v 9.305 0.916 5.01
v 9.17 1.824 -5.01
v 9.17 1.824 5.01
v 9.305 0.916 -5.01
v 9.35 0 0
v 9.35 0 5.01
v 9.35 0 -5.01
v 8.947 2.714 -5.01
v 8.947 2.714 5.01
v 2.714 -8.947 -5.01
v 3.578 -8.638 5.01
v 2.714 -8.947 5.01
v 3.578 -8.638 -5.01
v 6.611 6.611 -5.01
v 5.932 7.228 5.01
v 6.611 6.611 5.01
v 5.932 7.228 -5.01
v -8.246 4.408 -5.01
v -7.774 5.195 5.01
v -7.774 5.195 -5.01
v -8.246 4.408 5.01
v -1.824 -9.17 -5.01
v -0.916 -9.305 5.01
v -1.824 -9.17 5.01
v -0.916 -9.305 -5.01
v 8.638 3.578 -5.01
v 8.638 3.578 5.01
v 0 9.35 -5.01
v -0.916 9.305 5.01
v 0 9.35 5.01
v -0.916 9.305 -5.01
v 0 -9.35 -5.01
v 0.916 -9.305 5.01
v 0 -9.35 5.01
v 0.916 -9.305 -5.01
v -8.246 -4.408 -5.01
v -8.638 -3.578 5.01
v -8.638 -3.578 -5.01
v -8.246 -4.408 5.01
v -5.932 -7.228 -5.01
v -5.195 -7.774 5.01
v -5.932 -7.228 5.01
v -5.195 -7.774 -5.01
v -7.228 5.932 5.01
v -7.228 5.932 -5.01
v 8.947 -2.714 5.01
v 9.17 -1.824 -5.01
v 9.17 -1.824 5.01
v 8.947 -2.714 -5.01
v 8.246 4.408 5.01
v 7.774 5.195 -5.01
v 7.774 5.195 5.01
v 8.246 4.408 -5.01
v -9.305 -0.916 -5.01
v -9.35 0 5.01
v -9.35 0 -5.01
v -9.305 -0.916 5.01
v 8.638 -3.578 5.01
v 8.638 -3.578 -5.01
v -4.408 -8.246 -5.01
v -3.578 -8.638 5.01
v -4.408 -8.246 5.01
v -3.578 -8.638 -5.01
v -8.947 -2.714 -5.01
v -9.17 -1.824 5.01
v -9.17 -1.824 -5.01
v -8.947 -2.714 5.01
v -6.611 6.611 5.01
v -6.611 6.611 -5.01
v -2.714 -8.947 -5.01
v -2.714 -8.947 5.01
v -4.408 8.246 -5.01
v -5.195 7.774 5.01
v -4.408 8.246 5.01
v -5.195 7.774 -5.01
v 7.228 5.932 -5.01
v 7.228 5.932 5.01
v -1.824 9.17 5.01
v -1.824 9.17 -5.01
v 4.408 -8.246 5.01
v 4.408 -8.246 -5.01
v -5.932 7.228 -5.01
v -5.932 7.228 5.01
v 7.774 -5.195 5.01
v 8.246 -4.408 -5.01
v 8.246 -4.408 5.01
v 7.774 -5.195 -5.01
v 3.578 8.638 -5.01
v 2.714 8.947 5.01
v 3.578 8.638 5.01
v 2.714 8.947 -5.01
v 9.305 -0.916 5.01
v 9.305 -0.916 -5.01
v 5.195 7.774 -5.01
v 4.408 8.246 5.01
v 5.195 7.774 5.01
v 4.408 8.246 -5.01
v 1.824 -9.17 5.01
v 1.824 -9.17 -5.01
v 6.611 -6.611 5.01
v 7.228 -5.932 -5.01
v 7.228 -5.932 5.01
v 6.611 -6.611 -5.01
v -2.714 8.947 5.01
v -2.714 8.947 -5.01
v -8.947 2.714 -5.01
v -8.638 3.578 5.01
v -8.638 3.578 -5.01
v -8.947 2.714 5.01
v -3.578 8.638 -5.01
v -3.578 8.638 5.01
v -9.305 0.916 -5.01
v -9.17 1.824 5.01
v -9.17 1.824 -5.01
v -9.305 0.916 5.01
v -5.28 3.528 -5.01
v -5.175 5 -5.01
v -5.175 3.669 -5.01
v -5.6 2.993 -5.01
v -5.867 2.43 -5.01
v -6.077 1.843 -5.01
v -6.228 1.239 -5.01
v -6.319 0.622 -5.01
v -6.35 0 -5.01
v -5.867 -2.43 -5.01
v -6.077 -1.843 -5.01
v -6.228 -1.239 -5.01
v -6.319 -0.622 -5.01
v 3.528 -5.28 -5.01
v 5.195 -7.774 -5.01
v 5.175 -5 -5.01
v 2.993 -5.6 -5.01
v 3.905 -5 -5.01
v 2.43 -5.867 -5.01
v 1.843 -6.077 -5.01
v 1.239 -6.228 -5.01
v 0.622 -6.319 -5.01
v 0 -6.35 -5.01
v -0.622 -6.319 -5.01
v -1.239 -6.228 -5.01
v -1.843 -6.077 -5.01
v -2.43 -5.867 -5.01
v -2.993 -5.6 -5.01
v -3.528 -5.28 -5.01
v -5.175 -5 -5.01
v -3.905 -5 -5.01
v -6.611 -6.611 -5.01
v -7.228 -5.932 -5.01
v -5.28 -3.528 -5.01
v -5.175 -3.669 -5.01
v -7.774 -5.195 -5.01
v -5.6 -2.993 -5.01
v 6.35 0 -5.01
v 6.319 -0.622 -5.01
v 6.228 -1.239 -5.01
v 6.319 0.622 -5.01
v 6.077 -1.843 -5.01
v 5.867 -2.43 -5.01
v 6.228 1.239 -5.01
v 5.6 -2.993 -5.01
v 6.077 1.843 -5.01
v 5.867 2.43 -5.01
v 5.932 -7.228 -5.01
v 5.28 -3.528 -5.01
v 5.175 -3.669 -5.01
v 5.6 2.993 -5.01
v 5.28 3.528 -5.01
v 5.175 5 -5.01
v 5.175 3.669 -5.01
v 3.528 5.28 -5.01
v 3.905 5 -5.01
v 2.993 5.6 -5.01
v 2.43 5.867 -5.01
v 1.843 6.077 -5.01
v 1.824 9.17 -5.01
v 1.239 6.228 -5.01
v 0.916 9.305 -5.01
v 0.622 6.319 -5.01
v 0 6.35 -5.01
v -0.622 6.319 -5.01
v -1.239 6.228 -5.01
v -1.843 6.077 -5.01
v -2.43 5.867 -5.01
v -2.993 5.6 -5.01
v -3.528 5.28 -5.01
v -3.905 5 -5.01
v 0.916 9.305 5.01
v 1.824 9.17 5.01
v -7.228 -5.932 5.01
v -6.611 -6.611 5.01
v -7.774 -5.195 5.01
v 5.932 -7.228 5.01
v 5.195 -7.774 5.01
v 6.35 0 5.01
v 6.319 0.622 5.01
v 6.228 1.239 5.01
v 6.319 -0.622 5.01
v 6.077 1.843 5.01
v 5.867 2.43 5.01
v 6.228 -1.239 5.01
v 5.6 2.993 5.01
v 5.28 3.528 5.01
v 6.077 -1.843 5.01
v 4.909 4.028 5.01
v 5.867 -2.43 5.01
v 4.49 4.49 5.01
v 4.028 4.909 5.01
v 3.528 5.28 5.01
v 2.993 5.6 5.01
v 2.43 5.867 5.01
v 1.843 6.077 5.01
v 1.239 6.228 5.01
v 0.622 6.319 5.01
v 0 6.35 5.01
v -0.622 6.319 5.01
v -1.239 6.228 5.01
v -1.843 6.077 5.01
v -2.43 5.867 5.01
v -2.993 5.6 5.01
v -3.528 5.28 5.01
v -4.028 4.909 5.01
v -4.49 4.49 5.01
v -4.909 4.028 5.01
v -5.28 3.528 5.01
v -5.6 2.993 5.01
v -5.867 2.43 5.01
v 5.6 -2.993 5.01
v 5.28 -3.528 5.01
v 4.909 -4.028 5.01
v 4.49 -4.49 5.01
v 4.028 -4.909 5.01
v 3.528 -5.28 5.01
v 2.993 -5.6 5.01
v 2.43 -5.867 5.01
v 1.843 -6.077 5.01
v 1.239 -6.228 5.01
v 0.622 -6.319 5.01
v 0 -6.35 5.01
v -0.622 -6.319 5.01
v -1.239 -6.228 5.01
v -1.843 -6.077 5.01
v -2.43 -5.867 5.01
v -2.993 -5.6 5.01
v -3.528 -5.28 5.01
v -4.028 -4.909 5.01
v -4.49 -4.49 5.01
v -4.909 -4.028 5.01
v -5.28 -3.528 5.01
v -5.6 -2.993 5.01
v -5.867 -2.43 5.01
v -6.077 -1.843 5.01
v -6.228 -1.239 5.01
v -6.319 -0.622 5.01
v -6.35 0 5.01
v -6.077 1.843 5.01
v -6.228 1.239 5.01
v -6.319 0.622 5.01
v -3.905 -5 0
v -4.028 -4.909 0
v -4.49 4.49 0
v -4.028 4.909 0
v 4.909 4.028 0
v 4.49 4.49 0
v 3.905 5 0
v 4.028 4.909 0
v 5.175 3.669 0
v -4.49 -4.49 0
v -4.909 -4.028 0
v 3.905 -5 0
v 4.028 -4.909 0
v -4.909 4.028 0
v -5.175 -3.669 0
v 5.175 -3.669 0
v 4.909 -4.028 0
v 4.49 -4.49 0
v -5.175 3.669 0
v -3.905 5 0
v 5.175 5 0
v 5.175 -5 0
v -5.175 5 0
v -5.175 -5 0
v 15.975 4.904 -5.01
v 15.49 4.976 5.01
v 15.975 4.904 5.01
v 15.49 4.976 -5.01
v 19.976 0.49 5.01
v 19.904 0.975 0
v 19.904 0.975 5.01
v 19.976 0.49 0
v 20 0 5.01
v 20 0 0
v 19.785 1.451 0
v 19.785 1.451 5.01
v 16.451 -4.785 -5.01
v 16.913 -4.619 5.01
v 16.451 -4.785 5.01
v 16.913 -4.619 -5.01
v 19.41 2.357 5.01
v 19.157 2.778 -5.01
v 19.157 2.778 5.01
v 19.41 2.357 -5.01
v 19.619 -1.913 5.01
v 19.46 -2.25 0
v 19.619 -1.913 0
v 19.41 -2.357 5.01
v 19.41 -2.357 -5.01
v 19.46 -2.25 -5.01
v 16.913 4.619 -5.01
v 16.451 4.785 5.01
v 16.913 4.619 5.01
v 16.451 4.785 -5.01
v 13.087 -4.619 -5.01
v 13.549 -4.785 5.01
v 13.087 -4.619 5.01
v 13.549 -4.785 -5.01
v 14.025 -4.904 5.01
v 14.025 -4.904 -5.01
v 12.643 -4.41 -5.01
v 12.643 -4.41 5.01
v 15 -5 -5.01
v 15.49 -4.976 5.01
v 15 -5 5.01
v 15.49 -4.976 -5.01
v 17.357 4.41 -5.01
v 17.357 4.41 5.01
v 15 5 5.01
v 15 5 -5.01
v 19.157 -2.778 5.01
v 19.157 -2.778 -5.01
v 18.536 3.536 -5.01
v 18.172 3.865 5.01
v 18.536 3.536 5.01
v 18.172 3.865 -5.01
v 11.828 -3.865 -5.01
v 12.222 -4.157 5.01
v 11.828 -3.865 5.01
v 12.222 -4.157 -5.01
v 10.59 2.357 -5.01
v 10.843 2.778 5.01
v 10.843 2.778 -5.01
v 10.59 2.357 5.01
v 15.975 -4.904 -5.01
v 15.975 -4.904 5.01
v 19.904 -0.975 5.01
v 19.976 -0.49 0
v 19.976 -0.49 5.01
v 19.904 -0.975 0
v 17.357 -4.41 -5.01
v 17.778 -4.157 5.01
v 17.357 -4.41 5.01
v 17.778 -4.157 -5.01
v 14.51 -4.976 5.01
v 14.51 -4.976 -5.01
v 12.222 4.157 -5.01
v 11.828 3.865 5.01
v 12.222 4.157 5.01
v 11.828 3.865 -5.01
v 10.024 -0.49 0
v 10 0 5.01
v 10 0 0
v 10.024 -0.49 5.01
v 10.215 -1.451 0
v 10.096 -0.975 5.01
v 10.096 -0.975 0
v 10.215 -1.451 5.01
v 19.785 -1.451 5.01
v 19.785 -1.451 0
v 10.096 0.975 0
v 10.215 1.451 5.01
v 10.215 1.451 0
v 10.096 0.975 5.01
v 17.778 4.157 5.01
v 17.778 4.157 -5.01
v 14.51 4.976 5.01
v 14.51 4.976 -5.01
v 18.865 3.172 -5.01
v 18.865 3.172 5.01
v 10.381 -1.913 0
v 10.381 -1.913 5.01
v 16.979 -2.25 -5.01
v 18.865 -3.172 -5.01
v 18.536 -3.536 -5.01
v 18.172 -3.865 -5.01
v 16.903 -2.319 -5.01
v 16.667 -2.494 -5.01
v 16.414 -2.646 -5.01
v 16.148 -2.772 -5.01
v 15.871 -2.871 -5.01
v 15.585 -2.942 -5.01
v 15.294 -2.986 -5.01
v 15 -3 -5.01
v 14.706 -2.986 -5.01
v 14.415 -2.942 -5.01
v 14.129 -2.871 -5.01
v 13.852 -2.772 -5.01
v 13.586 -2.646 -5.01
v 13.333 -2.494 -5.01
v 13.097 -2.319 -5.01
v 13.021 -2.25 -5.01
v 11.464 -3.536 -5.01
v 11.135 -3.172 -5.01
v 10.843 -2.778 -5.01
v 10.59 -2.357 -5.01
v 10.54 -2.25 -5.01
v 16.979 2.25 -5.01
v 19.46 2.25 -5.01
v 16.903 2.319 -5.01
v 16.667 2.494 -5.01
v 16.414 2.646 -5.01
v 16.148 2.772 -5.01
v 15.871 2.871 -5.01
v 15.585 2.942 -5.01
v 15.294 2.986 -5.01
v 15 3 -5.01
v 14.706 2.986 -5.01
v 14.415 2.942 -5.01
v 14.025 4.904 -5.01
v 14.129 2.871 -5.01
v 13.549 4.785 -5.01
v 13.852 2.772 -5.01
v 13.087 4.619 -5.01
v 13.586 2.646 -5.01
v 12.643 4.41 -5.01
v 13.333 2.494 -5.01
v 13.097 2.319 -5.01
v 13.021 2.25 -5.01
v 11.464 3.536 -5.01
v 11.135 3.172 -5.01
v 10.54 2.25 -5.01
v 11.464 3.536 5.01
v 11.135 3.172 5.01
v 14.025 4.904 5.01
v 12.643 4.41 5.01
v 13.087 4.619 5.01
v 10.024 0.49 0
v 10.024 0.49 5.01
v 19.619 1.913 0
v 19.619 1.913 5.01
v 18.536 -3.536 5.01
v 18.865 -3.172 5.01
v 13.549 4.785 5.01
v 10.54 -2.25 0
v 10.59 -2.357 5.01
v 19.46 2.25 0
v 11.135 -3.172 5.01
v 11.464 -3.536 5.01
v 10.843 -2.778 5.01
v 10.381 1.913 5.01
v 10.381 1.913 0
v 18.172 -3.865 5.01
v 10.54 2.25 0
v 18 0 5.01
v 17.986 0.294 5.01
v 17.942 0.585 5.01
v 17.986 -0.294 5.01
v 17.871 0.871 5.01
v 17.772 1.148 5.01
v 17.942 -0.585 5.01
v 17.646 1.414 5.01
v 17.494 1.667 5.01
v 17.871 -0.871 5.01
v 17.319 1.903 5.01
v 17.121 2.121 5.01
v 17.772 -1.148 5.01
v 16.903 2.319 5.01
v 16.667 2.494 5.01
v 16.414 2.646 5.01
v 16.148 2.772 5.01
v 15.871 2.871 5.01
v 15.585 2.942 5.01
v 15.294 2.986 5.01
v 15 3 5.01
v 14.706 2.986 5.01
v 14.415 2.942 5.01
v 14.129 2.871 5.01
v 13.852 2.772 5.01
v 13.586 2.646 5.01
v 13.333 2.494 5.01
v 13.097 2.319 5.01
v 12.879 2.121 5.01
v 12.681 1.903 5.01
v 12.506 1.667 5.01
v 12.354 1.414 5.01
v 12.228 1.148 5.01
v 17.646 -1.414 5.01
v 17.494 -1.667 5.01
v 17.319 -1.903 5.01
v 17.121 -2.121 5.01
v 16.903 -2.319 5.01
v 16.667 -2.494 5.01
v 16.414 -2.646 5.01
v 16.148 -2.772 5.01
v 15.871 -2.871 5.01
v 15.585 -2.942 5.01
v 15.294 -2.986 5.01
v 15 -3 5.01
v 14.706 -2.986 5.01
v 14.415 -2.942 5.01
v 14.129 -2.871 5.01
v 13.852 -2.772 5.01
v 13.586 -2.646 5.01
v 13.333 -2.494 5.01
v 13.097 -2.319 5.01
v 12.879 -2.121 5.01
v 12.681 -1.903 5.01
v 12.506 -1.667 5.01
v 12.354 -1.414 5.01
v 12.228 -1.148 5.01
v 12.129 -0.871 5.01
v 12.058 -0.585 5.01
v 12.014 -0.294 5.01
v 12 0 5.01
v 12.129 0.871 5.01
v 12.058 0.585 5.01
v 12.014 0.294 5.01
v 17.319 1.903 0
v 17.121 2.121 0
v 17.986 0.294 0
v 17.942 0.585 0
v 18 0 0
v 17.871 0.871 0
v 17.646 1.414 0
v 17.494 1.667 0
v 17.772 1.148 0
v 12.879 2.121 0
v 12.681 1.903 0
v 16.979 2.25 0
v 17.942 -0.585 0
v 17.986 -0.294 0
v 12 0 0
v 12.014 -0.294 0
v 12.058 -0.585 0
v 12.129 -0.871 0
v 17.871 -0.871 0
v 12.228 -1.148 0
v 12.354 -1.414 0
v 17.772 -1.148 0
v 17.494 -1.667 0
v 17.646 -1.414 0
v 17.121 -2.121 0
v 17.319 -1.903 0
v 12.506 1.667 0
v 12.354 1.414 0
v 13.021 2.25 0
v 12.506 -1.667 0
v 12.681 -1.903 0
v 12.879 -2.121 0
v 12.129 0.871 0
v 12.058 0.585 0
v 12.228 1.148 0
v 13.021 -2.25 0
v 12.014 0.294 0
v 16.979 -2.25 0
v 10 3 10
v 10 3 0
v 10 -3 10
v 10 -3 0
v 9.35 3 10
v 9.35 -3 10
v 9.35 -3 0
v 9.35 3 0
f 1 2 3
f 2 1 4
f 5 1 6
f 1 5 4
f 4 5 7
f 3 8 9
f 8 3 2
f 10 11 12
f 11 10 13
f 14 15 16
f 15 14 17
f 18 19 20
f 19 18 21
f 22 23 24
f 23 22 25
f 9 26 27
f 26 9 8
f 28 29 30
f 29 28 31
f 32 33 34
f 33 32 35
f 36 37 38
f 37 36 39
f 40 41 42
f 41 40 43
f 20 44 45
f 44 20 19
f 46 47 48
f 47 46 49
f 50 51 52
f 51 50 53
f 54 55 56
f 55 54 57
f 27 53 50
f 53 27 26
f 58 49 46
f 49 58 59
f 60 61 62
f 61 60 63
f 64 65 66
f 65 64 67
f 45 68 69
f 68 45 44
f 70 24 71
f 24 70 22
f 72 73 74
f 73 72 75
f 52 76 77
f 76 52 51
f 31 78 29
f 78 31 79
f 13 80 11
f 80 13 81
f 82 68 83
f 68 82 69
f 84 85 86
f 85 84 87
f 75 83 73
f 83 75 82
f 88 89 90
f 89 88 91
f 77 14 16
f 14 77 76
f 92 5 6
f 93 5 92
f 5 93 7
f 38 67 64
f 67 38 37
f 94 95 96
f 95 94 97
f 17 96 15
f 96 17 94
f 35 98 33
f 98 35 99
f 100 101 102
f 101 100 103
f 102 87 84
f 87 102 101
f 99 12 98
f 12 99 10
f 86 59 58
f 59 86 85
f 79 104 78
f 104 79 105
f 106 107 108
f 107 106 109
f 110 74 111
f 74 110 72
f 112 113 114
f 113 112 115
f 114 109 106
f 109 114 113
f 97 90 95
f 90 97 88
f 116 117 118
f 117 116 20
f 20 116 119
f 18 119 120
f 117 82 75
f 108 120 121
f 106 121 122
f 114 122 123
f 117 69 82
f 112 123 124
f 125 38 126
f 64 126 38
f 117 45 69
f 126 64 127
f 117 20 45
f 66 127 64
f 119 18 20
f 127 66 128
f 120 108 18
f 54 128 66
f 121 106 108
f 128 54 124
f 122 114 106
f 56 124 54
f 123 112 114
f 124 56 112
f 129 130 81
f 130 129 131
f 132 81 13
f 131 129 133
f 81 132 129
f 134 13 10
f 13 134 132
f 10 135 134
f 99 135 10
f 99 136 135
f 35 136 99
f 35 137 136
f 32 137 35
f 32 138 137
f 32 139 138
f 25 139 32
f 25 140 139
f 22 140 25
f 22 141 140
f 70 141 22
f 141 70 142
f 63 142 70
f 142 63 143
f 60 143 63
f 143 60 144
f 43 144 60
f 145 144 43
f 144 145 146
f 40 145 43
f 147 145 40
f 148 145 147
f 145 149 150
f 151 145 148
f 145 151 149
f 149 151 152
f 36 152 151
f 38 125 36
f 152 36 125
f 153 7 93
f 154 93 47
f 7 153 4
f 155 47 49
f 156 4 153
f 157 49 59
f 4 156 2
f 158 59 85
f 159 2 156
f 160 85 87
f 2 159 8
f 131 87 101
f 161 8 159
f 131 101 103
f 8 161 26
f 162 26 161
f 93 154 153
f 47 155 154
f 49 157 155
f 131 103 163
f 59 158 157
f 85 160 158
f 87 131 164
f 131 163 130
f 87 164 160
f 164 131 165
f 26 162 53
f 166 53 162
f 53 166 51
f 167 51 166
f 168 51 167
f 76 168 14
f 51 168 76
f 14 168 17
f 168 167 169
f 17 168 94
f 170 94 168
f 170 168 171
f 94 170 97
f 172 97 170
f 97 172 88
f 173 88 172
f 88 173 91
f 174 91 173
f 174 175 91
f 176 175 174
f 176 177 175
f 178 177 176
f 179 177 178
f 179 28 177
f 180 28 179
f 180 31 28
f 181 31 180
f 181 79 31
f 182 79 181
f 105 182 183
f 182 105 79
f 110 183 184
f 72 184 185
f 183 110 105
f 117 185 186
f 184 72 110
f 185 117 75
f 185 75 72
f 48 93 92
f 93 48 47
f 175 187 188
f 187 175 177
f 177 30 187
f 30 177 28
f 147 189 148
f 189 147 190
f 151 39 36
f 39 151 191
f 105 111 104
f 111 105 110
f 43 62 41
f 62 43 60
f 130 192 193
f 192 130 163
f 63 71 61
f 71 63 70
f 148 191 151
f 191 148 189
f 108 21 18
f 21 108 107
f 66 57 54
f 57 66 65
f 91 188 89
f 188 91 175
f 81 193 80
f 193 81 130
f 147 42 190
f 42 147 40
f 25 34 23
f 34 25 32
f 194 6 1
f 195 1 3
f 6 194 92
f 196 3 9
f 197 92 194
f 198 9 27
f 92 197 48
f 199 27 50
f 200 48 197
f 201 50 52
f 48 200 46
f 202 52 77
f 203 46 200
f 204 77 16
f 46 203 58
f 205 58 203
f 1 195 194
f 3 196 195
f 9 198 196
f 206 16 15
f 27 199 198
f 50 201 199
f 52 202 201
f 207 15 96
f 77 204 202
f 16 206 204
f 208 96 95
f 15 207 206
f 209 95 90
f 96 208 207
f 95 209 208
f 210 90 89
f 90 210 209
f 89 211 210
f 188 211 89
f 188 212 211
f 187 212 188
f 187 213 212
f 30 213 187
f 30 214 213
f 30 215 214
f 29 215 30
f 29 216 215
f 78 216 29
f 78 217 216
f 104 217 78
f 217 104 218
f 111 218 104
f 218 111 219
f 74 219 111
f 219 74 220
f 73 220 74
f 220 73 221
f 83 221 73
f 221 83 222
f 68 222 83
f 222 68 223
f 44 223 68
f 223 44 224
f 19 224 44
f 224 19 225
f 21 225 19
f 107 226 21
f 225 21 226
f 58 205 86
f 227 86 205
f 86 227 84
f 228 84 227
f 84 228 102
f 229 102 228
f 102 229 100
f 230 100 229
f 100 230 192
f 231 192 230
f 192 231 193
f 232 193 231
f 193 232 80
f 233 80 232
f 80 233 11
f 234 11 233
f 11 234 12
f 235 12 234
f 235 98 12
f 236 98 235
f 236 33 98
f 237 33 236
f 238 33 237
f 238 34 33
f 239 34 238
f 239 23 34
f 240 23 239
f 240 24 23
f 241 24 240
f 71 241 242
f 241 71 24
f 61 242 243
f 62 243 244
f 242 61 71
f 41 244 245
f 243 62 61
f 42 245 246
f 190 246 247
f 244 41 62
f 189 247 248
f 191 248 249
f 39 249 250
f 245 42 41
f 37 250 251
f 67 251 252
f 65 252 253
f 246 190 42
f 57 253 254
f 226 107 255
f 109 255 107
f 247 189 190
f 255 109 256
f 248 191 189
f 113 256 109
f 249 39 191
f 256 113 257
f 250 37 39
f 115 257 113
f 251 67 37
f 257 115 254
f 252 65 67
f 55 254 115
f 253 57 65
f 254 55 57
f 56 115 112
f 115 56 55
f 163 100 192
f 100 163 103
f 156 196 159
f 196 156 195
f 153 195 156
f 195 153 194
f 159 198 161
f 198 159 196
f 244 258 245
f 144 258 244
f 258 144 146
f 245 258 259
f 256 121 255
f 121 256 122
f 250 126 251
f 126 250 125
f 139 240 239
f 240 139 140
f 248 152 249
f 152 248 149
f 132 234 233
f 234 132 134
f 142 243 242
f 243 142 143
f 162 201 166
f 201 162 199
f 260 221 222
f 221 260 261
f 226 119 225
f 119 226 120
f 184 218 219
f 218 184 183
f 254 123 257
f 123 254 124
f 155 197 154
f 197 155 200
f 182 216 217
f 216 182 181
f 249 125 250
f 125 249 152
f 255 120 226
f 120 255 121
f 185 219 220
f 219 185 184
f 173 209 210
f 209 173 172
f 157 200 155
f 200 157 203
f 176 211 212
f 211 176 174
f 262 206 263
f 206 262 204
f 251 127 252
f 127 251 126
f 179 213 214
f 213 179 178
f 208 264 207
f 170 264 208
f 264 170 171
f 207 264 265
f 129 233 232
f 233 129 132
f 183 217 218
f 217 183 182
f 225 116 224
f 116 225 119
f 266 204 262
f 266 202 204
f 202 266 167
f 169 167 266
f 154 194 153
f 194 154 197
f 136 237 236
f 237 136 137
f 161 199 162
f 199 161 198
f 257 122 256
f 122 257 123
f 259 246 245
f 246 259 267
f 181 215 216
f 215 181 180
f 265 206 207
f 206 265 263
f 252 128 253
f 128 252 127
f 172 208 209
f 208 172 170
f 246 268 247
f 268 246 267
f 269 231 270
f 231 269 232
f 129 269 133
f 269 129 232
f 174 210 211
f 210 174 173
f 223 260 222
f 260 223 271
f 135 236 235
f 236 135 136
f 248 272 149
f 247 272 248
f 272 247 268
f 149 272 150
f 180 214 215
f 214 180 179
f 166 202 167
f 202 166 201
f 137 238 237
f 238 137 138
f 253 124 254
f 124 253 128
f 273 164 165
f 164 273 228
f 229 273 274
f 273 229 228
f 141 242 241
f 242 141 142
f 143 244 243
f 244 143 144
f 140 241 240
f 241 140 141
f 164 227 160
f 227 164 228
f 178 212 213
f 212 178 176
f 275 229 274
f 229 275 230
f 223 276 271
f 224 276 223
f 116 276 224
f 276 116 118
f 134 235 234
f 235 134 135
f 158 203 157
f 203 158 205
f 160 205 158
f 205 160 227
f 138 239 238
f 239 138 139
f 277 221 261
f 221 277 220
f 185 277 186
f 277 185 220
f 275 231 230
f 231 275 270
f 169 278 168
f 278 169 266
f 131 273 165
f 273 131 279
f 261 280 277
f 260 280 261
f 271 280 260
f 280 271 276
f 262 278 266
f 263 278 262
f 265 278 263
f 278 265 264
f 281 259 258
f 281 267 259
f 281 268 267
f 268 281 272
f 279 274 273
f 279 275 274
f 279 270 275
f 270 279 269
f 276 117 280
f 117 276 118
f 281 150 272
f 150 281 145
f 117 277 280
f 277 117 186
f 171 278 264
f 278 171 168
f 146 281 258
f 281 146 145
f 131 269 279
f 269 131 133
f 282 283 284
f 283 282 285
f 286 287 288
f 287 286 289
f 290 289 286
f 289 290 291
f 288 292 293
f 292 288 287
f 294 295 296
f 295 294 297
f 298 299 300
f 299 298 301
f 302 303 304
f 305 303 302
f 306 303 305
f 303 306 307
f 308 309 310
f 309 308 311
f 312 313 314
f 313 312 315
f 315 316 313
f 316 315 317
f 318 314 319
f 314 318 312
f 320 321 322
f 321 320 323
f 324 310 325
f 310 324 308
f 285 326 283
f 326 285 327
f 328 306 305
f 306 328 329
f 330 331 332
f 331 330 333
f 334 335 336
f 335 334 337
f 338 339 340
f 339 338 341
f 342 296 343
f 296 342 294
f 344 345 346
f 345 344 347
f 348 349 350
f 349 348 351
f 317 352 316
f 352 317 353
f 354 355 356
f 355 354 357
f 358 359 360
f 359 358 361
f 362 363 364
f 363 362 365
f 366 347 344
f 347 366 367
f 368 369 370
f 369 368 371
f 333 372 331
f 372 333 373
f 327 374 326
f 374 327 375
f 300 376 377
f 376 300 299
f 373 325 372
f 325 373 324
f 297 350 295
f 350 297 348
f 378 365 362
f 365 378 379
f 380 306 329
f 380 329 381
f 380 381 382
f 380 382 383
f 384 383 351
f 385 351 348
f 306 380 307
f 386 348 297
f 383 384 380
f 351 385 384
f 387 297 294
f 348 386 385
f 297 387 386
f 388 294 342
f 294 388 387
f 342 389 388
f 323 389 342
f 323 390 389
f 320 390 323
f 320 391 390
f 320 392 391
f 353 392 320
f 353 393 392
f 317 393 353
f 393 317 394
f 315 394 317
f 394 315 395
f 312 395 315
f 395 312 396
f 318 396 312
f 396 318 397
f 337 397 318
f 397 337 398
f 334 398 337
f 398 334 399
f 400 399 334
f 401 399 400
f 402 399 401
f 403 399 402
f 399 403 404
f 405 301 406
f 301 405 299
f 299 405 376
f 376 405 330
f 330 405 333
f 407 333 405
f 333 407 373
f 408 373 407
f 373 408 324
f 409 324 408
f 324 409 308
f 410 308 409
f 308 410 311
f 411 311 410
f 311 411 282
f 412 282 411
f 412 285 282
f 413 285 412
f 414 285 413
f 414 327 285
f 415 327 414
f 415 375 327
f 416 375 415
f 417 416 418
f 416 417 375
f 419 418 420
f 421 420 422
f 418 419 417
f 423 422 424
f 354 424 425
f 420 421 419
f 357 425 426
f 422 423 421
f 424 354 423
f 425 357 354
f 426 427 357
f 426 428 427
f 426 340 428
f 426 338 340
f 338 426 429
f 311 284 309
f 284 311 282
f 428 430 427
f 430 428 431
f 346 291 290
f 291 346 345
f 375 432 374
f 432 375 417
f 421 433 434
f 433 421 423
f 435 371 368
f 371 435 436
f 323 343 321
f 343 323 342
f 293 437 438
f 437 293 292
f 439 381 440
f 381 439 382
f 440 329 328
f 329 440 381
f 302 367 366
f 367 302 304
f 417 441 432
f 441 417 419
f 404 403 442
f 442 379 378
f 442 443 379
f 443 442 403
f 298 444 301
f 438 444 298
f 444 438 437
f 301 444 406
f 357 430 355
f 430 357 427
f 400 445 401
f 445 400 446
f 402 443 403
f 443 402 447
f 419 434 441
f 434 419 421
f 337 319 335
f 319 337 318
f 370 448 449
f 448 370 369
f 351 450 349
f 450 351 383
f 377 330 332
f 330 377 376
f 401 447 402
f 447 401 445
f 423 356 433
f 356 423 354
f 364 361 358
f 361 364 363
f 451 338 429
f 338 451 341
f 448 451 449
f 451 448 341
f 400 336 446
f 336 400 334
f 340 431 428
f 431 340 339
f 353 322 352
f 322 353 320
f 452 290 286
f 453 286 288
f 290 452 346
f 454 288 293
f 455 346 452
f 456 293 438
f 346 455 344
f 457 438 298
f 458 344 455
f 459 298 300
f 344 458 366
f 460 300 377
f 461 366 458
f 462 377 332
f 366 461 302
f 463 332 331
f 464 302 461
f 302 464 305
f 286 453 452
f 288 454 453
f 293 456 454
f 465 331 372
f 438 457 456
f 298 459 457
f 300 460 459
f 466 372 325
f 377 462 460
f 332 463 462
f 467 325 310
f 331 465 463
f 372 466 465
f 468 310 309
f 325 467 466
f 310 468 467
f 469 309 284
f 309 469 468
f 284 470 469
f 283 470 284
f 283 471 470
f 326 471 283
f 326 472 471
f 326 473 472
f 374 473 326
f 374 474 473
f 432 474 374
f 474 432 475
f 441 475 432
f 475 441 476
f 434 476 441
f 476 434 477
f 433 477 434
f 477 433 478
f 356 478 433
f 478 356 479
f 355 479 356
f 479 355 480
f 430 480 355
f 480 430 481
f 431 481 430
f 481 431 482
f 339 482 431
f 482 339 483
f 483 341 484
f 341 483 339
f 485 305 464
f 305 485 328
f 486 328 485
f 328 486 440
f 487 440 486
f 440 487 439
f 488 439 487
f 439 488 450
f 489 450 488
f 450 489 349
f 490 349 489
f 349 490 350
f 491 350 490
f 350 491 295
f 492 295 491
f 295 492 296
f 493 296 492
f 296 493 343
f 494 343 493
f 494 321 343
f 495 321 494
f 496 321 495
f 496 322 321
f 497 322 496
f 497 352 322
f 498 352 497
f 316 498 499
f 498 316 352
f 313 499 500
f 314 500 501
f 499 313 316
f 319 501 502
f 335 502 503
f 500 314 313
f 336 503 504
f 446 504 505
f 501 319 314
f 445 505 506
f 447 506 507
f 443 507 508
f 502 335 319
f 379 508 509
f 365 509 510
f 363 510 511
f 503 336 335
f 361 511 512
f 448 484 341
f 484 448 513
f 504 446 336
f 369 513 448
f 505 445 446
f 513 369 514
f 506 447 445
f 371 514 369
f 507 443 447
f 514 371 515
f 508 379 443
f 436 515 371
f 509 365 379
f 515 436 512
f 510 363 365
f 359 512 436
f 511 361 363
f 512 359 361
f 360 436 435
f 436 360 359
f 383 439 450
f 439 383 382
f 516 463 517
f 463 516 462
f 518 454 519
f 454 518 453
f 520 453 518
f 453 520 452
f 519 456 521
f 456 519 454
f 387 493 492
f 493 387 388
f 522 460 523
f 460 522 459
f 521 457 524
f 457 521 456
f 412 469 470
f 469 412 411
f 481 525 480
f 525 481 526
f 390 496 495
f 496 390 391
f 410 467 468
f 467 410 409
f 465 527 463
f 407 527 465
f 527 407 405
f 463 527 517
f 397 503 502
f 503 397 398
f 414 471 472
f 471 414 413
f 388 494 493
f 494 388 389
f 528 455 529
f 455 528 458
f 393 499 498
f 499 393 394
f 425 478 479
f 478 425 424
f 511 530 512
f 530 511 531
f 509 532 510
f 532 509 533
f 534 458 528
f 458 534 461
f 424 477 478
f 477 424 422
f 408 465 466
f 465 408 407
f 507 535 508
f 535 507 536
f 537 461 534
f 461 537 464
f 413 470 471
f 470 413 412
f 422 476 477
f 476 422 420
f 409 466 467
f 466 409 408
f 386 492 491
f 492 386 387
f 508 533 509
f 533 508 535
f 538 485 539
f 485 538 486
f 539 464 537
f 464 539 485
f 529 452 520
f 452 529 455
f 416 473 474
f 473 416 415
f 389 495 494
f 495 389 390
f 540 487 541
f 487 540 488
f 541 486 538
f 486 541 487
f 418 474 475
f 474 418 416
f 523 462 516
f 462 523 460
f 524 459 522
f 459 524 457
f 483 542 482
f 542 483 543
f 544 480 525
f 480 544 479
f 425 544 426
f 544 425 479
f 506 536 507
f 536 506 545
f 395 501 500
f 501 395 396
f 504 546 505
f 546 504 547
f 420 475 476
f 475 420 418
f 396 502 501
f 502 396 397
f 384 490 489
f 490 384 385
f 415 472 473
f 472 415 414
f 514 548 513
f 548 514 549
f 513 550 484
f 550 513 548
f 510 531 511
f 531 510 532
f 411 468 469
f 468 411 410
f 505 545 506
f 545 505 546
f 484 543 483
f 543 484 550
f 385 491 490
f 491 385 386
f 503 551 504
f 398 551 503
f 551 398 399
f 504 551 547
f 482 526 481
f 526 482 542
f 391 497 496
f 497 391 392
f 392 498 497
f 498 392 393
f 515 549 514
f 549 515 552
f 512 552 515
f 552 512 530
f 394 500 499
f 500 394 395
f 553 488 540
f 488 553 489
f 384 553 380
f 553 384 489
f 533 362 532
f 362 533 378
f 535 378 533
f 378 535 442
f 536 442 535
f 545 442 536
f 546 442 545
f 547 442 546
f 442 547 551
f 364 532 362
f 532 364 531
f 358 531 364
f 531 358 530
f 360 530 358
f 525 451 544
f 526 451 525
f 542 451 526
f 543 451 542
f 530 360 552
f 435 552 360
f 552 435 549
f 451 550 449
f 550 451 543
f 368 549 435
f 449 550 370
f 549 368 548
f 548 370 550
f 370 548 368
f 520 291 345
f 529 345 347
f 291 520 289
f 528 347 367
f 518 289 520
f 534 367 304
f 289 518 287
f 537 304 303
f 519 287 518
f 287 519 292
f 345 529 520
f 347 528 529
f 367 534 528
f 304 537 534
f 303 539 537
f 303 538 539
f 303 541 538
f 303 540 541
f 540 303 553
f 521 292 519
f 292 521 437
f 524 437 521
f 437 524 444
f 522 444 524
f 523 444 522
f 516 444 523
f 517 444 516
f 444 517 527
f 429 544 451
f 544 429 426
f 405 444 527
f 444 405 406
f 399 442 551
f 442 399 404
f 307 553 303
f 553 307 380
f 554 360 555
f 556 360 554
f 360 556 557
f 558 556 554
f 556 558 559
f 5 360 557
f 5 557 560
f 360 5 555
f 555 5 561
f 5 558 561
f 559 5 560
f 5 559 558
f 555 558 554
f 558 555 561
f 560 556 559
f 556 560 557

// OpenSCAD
$fn = 64;

// Dimensions
rod_id = 12.7;        // inner diameter of rod ring (mm)
rod_wall = 3;         // wall thickness of rod ring (mm)
rod_od = rod_id + 2 * rod_wall;  // outer diameter of rod ring (mm)
rod_ring_height = 10; // height of the entire part (Z)

tubing_id = 6;        // inner diameter of tubing ring (mm)
tubing_wall = 2;      // wall thickness of tubing ring (mm)
tubing_od = tubing_id + 2 * tubing_wall; // outer diameter of tubing ring (mm)

bridge_width = 6;     // width in Y-direction of the bridge (mm)
bridge_x_start = 8;   // start x-coordinate of bridge
bridge_x_end = 12;    // end x-coordinate of bridge

// Opening cut dimensions
rod_opening_width = 10;   // width of rod ring opening (mm)
tubing_opening_width = 4.5; // width of tubing ring opening (mm)

// Calculate y-limits for cuts
rod_cut_y = rod_opening_width / 2;
tubing_cut_y = tubing_opening_width / 2;

// Rod ring (outer circle minus inner circle)
rod_ring_outer = rod_od / 2;
rod_ring_inner = rod_id / 2;

// Tubing ring (outer circle minus inner circle)
tubing_ring_outer = tubing_od / 2;
tubing_ring_inner = tubing_id / 2;

// Build the part
module rod_ring_with_cut() {
    difference() {
        // Outer circle
        cylinder(h = rod_ring_height + 0.02, r = rod_ring_outer, center = true);
        // Inner circle (hole)
        cylinder(h = rod_ring_height + 0.02, r = rod_ring_inner, center = true);
        // Opening cut: remove x < 0 and -5 < y < 5
        translate([0, 0, -(rod_ring_height + 0.02)/2])
            cube([rod_ring_outer + 1, rod_opening_width, rod_ring_height + 0.02], center = true);
    }
}

module tubing_ring_with_cut() {
    // Position tubing ring at x = 15
    translate([15, 0, 0]) {
        difference() {
            // Outer circle
            cylinder(h = rod_ring_height + 0.02, r = tubing_ring_outer, center = true);
            // Inner circle (hole)
            cylinder(h = rod_ring_height + 0.02, r = tubing_ring_inner, center = true);
            // Opening cut: remove x > 15 and -2.25 < y < 2.25
            translate([0, 0, -(rod_ring_height + 0.02)/2])
                cube([rod_ring_outer + 1, tubing_opening_width, rod_ring_height + 0.02], center = true);
        }
    }
}

module bridge() {
    // Bridge between rod ring and tubing ring
    // y-range: -bridge_width/2 to +bridge_width/2
    // x-range: from rod ring outer edge (rod_od/2) to tubing ring inner edge (15 - tubing_ring_outer)
    // but constrained to [bridge_x_start, bridge_x_end]
    x_start = max(bridge_x_start, rod_ring_outer);
    x_end = min(bridge_x_end, 15 - tubing_ring_outer);
    
    if (x_start < x_end) {
        translate([x_start, -bridge_width/2, 0])
            cube([x_end - x_start, bridge_width, rod_ring_height]);
    }
}

// Assemble the part
rod_ring_with_cut();
tubing_ring_with_cut();
bridge();
